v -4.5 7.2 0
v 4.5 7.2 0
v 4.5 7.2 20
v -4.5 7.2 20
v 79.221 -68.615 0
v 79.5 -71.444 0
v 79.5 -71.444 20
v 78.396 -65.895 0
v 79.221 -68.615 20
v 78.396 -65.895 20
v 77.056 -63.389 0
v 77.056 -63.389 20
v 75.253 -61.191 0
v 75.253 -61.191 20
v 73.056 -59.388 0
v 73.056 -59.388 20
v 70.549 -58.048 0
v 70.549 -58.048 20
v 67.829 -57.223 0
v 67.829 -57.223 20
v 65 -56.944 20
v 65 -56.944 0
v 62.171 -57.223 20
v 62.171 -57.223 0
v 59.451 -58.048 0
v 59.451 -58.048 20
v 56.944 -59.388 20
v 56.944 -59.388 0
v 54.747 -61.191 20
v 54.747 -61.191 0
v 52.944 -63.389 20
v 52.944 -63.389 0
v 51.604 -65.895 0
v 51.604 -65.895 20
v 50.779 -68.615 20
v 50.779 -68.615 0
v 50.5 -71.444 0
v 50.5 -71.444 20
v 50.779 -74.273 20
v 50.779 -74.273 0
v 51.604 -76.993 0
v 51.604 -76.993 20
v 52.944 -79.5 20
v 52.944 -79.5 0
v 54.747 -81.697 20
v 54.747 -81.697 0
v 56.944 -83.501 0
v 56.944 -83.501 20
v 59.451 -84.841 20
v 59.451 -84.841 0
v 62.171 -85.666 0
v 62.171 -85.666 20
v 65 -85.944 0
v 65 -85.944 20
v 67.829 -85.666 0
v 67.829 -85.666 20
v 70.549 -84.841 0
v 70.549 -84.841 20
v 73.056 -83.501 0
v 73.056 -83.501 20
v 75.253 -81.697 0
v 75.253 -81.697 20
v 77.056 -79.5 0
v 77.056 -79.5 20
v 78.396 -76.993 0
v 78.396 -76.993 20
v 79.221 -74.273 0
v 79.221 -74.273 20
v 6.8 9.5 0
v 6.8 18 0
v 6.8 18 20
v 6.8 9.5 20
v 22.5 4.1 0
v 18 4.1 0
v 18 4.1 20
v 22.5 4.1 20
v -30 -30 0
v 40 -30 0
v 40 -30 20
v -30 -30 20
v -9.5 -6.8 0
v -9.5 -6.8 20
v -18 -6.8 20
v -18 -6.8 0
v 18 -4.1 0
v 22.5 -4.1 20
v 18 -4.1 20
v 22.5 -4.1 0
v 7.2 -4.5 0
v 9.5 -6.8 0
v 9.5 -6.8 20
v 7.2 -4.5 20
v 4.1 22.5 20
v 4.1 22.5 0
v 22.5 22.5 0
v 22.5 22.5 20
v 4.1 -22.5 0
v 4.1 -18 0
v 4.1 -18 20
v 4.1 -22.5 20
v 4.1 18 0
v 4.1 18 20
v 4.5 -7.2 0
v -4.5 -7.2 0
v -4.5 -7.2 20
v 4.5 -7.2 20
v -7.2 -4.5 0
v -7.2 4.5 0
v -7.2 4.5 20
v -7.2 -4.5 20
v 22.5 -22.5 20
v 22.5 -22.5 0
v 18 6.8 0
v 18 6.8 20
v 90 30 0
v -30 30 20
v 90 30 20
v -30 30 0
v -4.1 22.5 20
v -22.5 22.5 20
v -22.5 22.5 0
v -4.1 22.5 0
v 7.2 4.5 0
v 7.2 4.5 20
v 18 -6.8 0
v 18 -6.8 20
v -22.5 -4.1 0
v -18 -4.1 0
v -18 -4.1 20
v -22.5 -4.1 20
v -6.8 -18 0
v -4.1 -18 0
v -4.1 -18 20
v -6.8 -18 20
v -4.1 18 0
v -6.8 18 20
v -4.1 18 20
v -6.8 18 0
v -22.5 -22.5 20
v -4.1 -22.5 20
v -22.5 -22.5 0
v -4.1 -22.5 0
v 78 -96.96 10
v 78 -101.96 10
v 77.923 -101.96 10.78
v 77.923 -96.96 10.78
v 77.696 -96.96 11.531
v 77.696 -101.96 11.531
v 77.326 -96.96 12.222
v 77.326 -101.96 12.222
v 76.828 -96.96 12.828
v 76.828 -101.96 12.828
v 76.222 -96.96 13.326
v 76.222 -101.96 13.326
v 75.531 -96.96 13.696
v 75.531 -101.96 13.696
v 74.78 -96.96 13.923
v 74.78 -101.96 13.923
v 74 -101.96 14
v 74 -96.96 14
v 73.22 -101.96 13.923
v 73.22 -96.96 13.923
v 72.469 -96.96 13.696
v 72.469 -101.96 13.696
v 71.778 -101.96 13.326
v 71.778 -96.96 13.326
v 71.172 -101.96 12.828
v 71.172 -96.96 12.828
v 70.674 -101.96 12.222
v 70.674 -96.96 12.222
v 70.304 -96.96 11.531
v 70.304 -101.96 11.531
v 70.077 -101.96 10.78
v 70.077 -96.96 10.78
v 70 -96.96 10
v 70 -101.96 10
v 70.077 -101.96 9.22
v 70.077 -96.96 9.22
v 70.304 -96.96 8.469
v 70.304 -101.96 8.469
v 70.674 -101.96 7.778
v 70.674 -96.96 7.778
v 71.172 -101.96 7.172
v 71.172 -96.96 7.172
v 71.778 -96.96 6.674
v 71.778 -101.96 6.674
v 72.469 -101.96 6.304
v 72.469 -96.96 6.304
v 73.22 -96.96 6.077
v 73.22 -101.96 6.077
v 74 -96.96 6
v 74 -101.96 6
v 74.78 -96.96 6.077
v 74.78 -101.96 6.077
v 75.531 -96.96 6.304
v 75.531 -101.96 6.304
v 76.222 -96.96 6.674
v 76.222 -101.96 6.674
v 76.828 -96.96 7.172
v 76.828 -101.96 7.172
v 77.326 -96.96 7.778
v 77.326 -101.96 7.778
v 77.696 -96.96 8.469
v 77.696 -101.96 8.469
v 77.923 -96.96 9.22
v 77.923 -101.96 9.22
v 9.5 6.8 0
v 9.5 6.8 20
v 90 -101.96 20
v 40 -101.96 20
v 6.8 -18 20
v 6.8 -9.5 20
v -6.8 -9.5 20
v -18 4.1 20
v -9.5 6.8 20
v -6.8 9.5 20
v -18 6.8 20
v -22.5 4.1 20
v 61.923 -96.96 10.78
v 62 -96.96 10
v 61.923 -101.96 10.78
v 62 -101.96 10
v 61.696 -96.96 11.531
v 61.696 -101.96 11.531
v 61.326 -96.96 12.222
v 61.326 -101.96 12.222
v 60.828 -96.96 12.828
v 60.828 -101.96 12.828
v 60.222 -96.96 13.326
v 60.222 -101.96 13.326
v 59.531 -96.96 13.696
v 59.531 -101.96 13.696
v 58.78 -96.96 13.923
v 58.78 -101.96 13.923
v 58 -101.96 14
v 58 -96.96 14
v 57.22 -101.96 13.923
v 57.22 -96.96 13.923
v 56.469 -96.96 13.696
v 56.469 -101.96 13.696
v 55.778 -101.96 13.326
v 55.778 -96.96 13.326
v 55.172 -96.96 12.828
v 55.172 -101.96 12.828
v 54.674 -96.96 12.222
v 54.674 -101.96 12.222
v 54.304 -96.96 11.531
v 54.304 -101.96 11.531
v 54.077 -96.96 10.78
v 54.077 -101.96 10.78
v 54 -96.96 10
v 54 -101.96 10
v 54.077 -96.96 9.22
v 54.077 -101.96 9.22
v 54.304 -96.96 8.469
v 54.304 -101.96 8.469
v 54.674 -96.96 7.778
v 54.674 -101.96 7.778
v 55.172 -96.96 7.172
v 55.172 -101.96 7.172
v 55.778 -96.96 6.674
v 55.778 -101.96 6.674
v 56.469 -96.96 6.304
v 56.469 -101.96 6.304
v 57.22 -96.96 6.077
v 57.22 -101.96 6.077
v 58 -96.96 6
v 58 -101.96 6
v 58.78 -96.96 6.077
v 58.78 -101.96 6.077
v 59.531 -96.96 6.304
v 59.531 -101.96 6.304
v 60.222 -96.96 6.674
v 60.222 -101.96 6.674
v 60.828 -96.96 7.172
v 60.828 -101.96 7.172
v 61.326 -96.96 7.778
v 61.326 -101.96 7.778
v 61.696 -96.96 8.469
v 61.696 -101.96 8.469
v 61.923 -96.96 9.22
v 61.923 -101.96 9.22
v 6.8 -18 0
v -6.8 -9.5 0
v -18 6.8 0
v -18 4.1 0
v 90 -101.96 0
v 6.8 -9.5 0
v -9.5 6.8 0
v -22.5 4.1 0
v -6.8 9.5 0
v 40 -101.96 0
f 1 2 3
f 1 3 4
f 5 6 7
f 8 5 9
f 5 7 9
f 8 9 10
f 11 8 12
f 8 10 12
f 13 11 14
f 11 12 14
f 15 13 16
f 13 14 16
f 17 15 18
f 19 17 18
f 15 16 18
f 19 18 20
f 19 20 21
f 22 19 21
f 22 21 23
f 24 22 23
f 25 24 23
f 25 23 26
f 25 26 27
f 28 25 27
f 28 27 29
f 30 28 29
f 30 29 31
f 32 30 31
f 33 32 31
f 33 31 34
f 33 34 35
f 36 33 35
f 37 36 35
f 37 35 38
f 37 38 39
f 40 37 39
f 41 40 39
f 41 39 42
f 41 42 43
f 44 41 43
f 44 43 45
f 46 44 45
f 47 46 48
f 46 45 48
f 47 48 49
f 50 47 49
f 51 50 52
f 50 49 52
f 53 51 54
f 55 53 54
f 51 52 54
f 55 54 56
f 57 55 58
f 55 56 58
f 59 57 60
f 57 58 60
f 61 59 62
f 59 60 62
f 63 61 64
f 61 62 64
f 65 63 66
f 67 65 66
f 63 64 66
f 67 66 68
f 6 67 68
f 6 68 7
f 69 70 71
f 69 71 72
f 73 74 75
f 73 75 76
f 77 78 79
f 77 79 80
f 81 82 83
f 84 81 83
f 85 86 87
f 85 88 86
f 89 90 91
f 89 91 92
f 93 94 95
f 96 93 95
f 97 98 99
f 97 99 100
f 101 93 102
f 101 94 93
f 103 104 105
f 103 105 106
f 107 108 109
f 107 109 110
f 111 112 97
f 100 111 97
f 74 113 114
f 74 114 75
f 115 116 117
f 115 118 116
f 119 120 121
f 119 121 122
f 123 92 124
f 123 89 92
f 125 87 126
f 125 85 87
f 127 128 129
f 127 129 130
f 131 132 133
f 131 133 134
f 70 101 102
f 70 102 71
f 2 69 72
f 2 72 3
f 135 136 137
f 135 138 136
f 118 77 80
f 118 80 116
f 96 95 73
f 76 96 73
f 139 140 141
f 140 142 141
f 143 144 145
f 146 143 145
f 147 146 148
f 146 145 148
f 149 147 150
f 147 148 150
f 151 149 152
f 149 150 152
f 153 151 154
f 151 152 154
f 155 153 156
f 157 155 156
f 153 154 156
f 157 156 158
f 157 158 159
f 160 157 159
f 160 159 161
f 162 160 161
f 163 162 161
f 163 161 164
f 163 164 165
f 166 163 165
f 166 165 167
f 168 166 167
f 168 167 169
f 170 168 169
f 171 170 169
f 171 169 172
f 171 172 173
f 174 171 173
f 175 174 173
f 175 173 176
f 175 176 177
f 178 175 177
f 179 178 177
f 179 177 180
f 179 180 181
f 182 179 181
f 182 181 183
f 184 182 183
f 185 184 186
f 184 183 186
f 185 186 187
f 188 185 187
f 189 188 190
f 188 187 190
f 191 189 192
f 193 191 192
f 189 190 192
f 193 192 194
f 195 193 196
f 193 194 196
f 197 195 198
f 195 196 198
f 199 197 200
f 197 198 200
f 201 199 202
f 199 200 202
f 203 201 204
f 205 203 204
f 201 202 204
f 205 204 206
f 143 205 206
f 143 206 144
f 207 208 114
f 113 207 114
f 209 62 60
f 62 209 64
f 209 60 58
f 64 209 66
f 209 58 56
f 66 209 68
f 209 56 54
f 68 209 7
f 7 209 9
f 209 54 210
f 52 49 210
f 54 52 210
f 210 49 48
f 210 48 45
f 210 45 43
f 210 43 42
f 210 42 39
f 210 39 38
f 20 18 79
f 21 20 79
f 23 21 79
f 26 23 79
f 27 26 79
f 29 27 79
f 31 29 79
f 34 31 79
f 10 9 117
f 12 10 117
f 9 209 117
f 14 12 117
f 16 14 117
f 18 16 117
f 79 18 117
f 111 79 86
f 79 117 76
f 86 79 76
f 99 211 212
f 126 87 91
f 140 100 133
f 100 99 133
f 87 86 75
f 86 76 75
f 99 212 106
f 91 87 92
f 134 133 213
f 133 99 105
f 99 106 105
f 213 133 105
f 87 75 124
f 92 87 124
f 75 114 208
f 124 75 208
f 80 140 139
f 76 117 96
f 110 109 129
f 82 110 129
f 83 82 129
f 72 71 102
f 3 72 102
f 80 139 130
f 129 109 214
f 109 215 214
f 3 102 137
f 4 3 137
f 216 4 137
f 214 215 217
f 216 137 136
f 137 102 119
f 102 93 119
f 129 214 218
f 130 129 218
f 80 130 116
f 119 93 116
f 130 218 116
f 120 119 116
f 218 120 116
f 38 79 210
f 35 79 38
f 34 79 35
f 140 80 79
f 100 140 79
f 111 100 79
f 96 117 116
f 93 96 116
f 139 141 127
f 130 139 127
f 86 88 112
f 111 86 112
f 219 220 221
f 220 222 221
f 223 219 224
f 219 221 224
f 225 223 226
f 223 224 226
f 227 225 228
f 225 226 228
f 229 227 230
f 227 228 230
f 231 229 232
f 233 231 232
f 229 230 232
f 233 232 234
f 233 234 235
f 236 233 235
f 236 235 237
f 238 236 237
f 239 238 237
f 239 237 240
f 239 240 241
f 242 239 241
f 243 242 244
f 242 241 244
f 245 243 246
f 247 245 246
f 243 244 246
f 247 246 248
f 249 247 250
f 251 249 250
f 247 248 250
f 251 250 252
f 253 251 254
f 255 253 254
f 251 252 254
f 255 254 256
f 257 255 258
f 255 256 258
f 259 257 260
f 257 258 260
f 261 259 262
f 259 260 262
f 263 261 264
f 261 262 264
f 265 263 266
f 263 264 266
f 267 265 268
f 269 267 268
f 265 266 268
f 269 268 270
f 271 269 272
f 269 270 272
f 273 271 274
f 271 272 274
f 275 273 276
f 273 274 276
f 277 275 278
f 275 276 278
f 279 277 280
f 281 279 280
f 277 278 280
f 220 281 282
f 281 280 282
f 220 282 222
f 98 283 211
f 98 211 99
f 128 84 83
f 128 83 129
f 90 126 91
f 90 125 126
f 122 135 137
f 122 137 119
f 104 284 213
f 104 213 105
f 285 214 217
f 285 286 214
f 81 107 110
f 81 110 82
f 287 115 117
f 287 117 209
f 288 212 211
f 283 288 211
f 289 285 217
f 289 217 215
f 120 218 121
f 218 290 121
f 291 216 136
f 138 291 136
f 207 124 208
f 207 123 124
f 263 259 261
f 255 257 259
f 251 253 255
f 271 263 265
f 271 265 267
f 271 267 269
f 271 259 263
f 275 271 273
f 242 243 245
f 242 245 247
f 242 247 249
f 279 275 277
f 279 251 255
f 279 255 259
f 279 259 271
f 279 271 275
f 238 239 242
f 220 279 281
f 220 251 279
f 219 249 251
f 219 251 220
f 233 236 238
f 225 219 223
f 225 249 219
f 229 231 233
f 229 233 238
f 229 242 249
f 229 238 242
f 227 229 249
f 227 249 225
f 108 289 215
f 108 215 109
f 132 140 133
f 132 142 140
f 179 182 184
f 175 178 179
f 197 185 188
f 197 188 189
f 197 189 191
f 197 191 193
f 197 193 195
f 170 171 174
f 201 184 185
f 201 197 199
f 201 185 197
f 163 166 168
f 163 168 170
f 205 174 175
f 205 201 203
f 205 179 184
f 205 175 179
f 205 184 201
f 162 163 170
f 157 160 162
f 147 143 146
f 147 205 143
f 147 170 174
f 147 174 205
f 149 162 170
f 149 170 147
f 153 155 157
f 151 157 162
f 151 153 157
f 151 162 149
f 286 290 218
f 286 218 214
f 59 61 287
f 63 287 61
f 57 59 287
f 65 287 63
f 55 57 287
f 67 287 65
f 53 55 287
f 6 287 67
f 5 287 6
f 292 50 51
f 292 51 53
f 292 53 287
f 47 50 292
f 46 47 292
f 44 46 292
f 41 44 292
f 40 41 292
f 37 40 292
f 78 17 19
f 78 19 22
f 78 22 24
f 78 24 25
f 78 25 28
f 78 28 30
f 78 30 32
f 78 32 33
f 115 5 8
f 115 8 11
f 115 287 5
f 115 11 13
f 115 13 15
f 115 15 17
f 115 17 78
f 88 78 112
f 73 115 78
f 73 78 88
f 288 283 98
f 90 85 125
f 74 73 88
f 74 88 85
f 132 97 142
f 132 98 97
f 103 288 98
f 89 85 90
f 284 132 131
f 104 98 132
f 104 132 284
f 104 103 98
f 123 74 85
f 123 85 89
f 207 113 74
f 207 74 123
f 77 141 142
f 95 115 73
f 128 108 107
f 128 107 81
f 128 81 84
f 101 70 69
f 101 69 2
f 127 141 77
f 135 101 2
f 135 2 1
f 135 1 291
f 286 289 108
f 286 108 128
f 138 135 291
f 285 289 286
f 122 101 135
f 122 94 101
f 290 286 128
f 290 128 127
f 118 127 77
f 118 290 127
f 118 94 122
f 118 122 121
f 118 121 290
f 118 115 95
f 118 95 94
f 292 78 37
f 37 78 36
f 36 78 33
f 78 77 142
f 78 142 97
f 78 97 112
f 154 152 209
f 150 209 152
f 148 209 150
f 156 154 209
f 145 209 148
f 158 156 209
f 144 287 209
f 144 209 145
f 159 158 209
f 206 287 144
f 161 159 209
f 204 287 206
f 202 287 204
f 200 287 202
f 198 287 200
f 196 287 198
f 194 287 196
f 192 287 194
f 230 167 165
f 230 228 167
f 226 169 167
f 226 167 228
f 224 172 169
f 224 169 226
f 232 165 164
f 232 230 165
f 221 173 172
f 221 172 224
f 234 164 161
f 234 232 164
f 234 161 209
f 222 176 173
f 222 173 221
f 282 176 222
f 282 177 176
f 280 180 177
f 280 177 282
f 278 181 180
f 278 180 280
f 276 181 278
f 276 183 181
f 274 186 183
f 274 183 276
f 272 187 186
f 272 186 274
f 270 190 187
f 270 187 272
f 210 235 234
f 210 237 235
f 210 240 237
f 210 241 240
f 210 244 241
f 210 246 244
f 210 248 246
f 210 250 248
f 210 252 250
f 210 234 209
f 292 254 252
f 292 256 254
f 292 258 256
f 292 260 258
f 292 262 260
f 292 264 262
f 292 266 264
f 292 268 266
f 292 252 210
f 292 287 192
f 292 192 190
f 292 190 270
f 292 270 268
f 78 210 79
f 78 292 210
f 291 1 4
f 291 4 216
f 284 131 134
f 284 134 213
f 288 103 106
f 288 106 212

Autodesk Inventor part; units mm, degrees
ref_plane "YZ Plane" through (0, 0, 0) normal (1, 0, 0) x (0, 1, 0)
ref_plane "XZ Plane" through (0, 0, 0) normal (0, 1, 0) x (-1, 0, 0)
ref_plane "XY Plane" through (0, 0, 0) normal (0, 0, 1) x (1, 0, 0)
sketch "Sketch1" plane through (0, 0, 0) normal (0, 0, 1) x (1, 0, 0)
  line L0 (-4.1, -22.5) -> (-4.1, -18)
  line L1 (-4.6, -18) -> (-6.8, -18)
  line L2 (-6.8, -18) -> (-6.8, -9.5)
  line L3 (-6.8, -9.5) -> (-4.5, -7.2)
  line L4 (-4.5, -7.2) -> (4.5, -7.2)
  line L5 (4.5, -7.2) -> (6.8, -9.5)
  line L6 (6.8, -9.5) -> (6.8, -18)
  line L7 (4.1, -18) -> (4.1, -22.5)
  line L8 (22.5, -4.1) -> (18, -4.1)
  line L9 (18, -4.6) -> (18, -6.8)
  line L10 (18, -6.8) -> (9.5, -6.8)
  line L11 (9.5, -6.8) -> (7.2, -4.5)
  line L12 (7.2, -4.5) -> (7.2, 4.5)
  line L13 (7.2, 4.5) -> (9.5, 6.8)
  line L14 (9.5, 6.8) -> (18, 6.8)
  line L15 (18, 4.1) -> (22.5, 4.1)
  line L16 (22.5, 22.5) -> (22.5, 4.4)
  line L17 (4.1, 22.5) -> (4.1, 18)
  line L18 (4.6, 18) -> (6.8, 18)
  line L19 (6.8, 18) -> (6.8, 9.5)
  line L20 (6.8, 9.5) -> (4.5, 7.2)
  line L21 (4.5, 7.2) -> (-4.5, 7.2)
  line L22 (-4.5, 7.2) -> (-6.8, 9.5)
  line L23 (-6.8, 9.5) -> (-6.8, 18)
  line L24 (-4.1, 18) -> (-4.1, 22.5)
  line L25 (-22.5, 22.5) -> (-4.4, 22.5)
  line L26 (-22.5, 4.1) -> (-18, 4.1)
  line L27 (-18, 6.8) -> (-9.5, 6.8)
  line L28 (-9.5, 6.8) -> (-7.2, 4.5)
  line L29 (-7.2, 4.5) -> (-7.2, -4.5)
  line L30 (-7.2, -4.5) -> (-9.5, -6.8)
  line L31 (-9.5, -6.8) -> (-18, -6.8)
  line L32 (-18, -6.8) -> (-18, -4.6)
  line L33 (-18, -4.1) -> (-22.5, -4.1)
  line L34 (-22.5, -22.5) -> (-22.5, -4.4)
  line L35 (-4.4, -22.5) -> (-22.5, -22.5)
  line L36 (-6.8, 18) -> (-4.1, 18)
  line L37 (4.1, 18) -> (4.6, 18)
  line L38 (-4.4, 22.5) -> (-3.1, 22.5)
  line L39 (3.1, 22.5) -> (22.5, 22.5)
  line L40 (18, 6.8) -> (18, 4.1)
  line L41 (18, -4.1) -> (18, -4.6)
  line L42 (22.5, 4.4) -> (22.5, 3.1)
  line L43 (22.5, -4.1) -> (22.5, -22.5)
  line L44 (6.8, -18) -> (4.1, -18)
  line L45 (-4.1, -18) -> (-4.6, -18)
  line L46 (22.5, -22.5) -> (4.1, -22.5)
  line L47 (-4.1, -22.5) -> (-4.4, -22.5)
  line L48 (-22.5, -4.4) -> (-22.5, -3.1)
  line L49 (-22.5, 3.1) -> (-22.5, 22.5)
  line L50 (-18, -4.6) -> (-18, -4.1)
  line L51 (-18, 4.1) -> (-18, 6.8)
  line L52 (-24.5, 24.5) -> (24.5, 24.5)
  line L53 (24.5, 24.5) -> (24.5, -24.5)
  line L54 (24.5, -24.5) -> (-24.5, -24.5)
  line L55 (-24.5, -24.5) -> (-24.5, 24.5)
  line L56 (-22.5, 3.1) -> (-17, 3.1)
  line L57 (-17, 5.8) -> (-9.5, 5.8)
  line L58 (-17, 3.1) -> (-17, 5.8)
  line L59 (-8.2, 4.5) -> (-8.2, 0)
  line L60 (-8.2, 4.5) -> (-9.5, 5.8)
  line L61 (-8.2, 4.5) -> (-5.6544, 4.5) construction
  line L62 (-24.5, 0) -> (0, 0)
  line L63 (-22.5, -3.1) -> (-17, -3.1)
  line L64 (-17, -3.1) -> (-17, -5.8)
  line L65 (-17, -5.8) -> (-9.5, -5.8)
  line L66 (-8.2, -4.5) -> (-8.2, 0)
  line L67 (-8.2, -4.5) -> (-9.5, -5.8)
  line L68 (-5.8, -17) -> (-5.8, -9.5)
  line L69 (-4.5, -8.2) -> (-5.8, -9.5)
  line L70 (-4.5, -8.2) -> (0, -8.2)
  line L71 (4.5, -8.2) -> (0, -8.2)
  line L72 (4.5, -8.2) -> (5.8, -9.5)
  line L73 (5.8, -17) -> (5.8, -9.5)
  line L74 (3.1, -17) -> (5.8, -17)
  line L75 (3.1, -22.5) -> (3.1, -17)
  line L76 (-3.1, -17) -> (-5.8, -17)
  line L77 (-3.1, -22.5) -> (-3.1, -17)
  line L78 (17, -5.8) -> (9.5, -5.8)
  line L79 (8.2, -4.5) -> (9.5, -5.8)
  line L80 (8.2, -4.5) -> (8.2, 0)
  line L81 (8.2, 4.5) -> (8.2, 0)
  line L82 (8.2, 4.5) -> (9.5, 5.8)
  line L83 (17, 5.8) -> (9.5, 5.8)
  line L84 (17, 3.1) -> (17, 5.8)
  line L85 (22.5, 3.1) -> (17, 3.1)
  line L86 (17, -3.1) -> (17, -5.8)
  line L87 (22.5, -3.1) -> (17, -3.1)
  line L88 (5.8, 17) -> (5.8, 9.5)
  line L89 (4.5, 8.2) -> (5.8, 9.5)
  line L90 (4.5, 8.2) -> (0, 8.2)
  line L91 (-4.5, 8.2) -> (0, 8.2)
  line L92 (-4.5, 8.2) -> (-5.8, 9.5)
  line L93 (-5.8, 17) -> (-5.8, 9.5)
  line L94 (-3.1, 17) -> (-5.8, 17)
  line L95 (-3.1, 22.5) -> (-3.1, 17)
  line L96 (3.1, 17) -> (5.8, 17)
  line L97 (3.1, 22.5) -> (3.1, 17)
  line L98 (22.5, -4.1) -> (22.5, -3.1)
  line L99 (4.1, -22.5) -> (3.1, -22.5)
  line L100 (-3.1, -22.5) -> (-4.1, -22.5)
  dimension "d7" = 45
  dimension "d8" = 49
  dimension "d9" = 49
  dimension "d11" = 24.5
  dimension "d12" = 24.5
  dimension "d13" = 1
  dimension "d14" = 1
  dimension "d15" = 1
  dimension "d16" = 135
  dimension "d17" = 4.5
  dimension "d20" = 360
extrude "Extrusion3" add sketch "Sketch1" along normal blind 20 contours L55 L52 L53 L54 | L0 L45 L1 L2 L3 L4 L5 L6 L44 L7 L99 L75 L74 L73 L72 L71 L70 L69 L68 L76 L77 L100 | L48 L63 L64 L65 L67 L66 L62 L29 L30 L31 L32 L50 L33 | L62 L59 L60 L57 L58 L56 L49 L26 L51 L27 L28 L29 | L8 L41 L9 L10 L11 L12 L13 L14 L40 L15 L42 L85 L84 L83 L82 L81 L80 L79 L78 L86 L87 L98 | L38 L95 L94 L93 L92 L91 L90 L89 L88 L96 L97 L39 L17 L37 L18 L19 L20 L21 L22 L23 L36 L24
sketch "Sketch3" plane through (0, 0, 0) normal (0, 0, -1) x (-1, 0, 0)
  line L0 (24.5, -24.5) -> (24.5, 24.5) projected
  line L1 (24.5, 24.5) -> (-24.5, 24.5) projected
  line L2 (-24.5, 24.5) -> (-24.5, -24.5) projected
  line L3 (-24.5, -24.5) -> (24.5, -24.5) projected
  line L4 (30, 30) -> (-90, 30)
  line L5 (-40, -30) -> (30, -30)
  line L6 (30, -30) -> (30, 30)
  line L7 (-90, -101.9604) -> (-40, -101.9604)
  line L8 (-40, -101.9604) -> (-40, -30)
  line L9 (-90, 30) -> (-90, -101.9604)
  point P0 (0, 0)
  dimension "d25" = 60
  dimension "d26" = 5.5
  dimension "d27" = 49
  dimension "d28" = 5.5
  dimension "d32" = 120
extrude "Extrusion4" add sketch "Sketch3" against normal blind 20
sketch "Sketch4" plane through (0, 0, 20) normal (0, 0, 1) x (1, 0, 0)
  circle A0 centre (65, -71.4443) radius 14.5
  line L0 (40, -101.9604) -> (90, -101.9604) projected
  line L1 (40, -30) -> (40, -101.9604) projected
  point P0 (0, 0)
  dimension "d33" = 29
  dimension "d34" = 50
  dimension "d35" = 25
extrude "Extrusion5" cut sketch "Sketch4" against normal up to next
sketch "Sketch5" plane through (40, -101.9604, 0) normal (0, -1, 0) x (1, 0, 0)
  line L0 (0, 20) -> (50, 20) projected
  line L1 (-70, 20) -> (0, 20) projected
  line L2 (-70, 0) -> (-70, 20) projected
  line L3 (0, 0) -> (-70, 0) projected
  line L4 (50, 0) -> (0, 0) projected
  line L5 (50, 0) -> (50, 20) projected
  circle A0 centre (34, 10) radius 4
  circle A1 centre (18, 10) radius 4
  line L6 (50, 0) -> (0, 0) projected
  line L7 (50, 0) -> (50, 20) projected
  line L8 (0, 20) -> (50, 20) projected
  line L9 (0, 0) -> (0, 20) projected
  point P0 (-40, 0)
  dimension "d38" = 8
  dimension "d39" = 8
  dimension "d40" = 16
  dimension "d41" = 20
  dimension "d42" = 10
  dimension "d43" = 10
  dimension "d44" = 32
extrude "Extrusion6" cut sketch "Sketch5" against normal blind 5 contours A0 | A1
equation "\"d9\" = d8"
equation "\"d11\" = 0.5 * d8"
equation "\"d12\" = d11"
equation "\"d26\" = d28"
equation "\"d28\" = -0.5 * d27 + 0.5 * d25"
equation "\"d35\" = 0.5 * d34"
equation "\"d39\" = d38"
equation "\"d42\" = 0.5 * d41"
equation "\"d43\" = d42"
equation "\"d44\" = d40 + 2 * d39"
properties part number "TrackPowerJoint" material "Aluminum-6061"
